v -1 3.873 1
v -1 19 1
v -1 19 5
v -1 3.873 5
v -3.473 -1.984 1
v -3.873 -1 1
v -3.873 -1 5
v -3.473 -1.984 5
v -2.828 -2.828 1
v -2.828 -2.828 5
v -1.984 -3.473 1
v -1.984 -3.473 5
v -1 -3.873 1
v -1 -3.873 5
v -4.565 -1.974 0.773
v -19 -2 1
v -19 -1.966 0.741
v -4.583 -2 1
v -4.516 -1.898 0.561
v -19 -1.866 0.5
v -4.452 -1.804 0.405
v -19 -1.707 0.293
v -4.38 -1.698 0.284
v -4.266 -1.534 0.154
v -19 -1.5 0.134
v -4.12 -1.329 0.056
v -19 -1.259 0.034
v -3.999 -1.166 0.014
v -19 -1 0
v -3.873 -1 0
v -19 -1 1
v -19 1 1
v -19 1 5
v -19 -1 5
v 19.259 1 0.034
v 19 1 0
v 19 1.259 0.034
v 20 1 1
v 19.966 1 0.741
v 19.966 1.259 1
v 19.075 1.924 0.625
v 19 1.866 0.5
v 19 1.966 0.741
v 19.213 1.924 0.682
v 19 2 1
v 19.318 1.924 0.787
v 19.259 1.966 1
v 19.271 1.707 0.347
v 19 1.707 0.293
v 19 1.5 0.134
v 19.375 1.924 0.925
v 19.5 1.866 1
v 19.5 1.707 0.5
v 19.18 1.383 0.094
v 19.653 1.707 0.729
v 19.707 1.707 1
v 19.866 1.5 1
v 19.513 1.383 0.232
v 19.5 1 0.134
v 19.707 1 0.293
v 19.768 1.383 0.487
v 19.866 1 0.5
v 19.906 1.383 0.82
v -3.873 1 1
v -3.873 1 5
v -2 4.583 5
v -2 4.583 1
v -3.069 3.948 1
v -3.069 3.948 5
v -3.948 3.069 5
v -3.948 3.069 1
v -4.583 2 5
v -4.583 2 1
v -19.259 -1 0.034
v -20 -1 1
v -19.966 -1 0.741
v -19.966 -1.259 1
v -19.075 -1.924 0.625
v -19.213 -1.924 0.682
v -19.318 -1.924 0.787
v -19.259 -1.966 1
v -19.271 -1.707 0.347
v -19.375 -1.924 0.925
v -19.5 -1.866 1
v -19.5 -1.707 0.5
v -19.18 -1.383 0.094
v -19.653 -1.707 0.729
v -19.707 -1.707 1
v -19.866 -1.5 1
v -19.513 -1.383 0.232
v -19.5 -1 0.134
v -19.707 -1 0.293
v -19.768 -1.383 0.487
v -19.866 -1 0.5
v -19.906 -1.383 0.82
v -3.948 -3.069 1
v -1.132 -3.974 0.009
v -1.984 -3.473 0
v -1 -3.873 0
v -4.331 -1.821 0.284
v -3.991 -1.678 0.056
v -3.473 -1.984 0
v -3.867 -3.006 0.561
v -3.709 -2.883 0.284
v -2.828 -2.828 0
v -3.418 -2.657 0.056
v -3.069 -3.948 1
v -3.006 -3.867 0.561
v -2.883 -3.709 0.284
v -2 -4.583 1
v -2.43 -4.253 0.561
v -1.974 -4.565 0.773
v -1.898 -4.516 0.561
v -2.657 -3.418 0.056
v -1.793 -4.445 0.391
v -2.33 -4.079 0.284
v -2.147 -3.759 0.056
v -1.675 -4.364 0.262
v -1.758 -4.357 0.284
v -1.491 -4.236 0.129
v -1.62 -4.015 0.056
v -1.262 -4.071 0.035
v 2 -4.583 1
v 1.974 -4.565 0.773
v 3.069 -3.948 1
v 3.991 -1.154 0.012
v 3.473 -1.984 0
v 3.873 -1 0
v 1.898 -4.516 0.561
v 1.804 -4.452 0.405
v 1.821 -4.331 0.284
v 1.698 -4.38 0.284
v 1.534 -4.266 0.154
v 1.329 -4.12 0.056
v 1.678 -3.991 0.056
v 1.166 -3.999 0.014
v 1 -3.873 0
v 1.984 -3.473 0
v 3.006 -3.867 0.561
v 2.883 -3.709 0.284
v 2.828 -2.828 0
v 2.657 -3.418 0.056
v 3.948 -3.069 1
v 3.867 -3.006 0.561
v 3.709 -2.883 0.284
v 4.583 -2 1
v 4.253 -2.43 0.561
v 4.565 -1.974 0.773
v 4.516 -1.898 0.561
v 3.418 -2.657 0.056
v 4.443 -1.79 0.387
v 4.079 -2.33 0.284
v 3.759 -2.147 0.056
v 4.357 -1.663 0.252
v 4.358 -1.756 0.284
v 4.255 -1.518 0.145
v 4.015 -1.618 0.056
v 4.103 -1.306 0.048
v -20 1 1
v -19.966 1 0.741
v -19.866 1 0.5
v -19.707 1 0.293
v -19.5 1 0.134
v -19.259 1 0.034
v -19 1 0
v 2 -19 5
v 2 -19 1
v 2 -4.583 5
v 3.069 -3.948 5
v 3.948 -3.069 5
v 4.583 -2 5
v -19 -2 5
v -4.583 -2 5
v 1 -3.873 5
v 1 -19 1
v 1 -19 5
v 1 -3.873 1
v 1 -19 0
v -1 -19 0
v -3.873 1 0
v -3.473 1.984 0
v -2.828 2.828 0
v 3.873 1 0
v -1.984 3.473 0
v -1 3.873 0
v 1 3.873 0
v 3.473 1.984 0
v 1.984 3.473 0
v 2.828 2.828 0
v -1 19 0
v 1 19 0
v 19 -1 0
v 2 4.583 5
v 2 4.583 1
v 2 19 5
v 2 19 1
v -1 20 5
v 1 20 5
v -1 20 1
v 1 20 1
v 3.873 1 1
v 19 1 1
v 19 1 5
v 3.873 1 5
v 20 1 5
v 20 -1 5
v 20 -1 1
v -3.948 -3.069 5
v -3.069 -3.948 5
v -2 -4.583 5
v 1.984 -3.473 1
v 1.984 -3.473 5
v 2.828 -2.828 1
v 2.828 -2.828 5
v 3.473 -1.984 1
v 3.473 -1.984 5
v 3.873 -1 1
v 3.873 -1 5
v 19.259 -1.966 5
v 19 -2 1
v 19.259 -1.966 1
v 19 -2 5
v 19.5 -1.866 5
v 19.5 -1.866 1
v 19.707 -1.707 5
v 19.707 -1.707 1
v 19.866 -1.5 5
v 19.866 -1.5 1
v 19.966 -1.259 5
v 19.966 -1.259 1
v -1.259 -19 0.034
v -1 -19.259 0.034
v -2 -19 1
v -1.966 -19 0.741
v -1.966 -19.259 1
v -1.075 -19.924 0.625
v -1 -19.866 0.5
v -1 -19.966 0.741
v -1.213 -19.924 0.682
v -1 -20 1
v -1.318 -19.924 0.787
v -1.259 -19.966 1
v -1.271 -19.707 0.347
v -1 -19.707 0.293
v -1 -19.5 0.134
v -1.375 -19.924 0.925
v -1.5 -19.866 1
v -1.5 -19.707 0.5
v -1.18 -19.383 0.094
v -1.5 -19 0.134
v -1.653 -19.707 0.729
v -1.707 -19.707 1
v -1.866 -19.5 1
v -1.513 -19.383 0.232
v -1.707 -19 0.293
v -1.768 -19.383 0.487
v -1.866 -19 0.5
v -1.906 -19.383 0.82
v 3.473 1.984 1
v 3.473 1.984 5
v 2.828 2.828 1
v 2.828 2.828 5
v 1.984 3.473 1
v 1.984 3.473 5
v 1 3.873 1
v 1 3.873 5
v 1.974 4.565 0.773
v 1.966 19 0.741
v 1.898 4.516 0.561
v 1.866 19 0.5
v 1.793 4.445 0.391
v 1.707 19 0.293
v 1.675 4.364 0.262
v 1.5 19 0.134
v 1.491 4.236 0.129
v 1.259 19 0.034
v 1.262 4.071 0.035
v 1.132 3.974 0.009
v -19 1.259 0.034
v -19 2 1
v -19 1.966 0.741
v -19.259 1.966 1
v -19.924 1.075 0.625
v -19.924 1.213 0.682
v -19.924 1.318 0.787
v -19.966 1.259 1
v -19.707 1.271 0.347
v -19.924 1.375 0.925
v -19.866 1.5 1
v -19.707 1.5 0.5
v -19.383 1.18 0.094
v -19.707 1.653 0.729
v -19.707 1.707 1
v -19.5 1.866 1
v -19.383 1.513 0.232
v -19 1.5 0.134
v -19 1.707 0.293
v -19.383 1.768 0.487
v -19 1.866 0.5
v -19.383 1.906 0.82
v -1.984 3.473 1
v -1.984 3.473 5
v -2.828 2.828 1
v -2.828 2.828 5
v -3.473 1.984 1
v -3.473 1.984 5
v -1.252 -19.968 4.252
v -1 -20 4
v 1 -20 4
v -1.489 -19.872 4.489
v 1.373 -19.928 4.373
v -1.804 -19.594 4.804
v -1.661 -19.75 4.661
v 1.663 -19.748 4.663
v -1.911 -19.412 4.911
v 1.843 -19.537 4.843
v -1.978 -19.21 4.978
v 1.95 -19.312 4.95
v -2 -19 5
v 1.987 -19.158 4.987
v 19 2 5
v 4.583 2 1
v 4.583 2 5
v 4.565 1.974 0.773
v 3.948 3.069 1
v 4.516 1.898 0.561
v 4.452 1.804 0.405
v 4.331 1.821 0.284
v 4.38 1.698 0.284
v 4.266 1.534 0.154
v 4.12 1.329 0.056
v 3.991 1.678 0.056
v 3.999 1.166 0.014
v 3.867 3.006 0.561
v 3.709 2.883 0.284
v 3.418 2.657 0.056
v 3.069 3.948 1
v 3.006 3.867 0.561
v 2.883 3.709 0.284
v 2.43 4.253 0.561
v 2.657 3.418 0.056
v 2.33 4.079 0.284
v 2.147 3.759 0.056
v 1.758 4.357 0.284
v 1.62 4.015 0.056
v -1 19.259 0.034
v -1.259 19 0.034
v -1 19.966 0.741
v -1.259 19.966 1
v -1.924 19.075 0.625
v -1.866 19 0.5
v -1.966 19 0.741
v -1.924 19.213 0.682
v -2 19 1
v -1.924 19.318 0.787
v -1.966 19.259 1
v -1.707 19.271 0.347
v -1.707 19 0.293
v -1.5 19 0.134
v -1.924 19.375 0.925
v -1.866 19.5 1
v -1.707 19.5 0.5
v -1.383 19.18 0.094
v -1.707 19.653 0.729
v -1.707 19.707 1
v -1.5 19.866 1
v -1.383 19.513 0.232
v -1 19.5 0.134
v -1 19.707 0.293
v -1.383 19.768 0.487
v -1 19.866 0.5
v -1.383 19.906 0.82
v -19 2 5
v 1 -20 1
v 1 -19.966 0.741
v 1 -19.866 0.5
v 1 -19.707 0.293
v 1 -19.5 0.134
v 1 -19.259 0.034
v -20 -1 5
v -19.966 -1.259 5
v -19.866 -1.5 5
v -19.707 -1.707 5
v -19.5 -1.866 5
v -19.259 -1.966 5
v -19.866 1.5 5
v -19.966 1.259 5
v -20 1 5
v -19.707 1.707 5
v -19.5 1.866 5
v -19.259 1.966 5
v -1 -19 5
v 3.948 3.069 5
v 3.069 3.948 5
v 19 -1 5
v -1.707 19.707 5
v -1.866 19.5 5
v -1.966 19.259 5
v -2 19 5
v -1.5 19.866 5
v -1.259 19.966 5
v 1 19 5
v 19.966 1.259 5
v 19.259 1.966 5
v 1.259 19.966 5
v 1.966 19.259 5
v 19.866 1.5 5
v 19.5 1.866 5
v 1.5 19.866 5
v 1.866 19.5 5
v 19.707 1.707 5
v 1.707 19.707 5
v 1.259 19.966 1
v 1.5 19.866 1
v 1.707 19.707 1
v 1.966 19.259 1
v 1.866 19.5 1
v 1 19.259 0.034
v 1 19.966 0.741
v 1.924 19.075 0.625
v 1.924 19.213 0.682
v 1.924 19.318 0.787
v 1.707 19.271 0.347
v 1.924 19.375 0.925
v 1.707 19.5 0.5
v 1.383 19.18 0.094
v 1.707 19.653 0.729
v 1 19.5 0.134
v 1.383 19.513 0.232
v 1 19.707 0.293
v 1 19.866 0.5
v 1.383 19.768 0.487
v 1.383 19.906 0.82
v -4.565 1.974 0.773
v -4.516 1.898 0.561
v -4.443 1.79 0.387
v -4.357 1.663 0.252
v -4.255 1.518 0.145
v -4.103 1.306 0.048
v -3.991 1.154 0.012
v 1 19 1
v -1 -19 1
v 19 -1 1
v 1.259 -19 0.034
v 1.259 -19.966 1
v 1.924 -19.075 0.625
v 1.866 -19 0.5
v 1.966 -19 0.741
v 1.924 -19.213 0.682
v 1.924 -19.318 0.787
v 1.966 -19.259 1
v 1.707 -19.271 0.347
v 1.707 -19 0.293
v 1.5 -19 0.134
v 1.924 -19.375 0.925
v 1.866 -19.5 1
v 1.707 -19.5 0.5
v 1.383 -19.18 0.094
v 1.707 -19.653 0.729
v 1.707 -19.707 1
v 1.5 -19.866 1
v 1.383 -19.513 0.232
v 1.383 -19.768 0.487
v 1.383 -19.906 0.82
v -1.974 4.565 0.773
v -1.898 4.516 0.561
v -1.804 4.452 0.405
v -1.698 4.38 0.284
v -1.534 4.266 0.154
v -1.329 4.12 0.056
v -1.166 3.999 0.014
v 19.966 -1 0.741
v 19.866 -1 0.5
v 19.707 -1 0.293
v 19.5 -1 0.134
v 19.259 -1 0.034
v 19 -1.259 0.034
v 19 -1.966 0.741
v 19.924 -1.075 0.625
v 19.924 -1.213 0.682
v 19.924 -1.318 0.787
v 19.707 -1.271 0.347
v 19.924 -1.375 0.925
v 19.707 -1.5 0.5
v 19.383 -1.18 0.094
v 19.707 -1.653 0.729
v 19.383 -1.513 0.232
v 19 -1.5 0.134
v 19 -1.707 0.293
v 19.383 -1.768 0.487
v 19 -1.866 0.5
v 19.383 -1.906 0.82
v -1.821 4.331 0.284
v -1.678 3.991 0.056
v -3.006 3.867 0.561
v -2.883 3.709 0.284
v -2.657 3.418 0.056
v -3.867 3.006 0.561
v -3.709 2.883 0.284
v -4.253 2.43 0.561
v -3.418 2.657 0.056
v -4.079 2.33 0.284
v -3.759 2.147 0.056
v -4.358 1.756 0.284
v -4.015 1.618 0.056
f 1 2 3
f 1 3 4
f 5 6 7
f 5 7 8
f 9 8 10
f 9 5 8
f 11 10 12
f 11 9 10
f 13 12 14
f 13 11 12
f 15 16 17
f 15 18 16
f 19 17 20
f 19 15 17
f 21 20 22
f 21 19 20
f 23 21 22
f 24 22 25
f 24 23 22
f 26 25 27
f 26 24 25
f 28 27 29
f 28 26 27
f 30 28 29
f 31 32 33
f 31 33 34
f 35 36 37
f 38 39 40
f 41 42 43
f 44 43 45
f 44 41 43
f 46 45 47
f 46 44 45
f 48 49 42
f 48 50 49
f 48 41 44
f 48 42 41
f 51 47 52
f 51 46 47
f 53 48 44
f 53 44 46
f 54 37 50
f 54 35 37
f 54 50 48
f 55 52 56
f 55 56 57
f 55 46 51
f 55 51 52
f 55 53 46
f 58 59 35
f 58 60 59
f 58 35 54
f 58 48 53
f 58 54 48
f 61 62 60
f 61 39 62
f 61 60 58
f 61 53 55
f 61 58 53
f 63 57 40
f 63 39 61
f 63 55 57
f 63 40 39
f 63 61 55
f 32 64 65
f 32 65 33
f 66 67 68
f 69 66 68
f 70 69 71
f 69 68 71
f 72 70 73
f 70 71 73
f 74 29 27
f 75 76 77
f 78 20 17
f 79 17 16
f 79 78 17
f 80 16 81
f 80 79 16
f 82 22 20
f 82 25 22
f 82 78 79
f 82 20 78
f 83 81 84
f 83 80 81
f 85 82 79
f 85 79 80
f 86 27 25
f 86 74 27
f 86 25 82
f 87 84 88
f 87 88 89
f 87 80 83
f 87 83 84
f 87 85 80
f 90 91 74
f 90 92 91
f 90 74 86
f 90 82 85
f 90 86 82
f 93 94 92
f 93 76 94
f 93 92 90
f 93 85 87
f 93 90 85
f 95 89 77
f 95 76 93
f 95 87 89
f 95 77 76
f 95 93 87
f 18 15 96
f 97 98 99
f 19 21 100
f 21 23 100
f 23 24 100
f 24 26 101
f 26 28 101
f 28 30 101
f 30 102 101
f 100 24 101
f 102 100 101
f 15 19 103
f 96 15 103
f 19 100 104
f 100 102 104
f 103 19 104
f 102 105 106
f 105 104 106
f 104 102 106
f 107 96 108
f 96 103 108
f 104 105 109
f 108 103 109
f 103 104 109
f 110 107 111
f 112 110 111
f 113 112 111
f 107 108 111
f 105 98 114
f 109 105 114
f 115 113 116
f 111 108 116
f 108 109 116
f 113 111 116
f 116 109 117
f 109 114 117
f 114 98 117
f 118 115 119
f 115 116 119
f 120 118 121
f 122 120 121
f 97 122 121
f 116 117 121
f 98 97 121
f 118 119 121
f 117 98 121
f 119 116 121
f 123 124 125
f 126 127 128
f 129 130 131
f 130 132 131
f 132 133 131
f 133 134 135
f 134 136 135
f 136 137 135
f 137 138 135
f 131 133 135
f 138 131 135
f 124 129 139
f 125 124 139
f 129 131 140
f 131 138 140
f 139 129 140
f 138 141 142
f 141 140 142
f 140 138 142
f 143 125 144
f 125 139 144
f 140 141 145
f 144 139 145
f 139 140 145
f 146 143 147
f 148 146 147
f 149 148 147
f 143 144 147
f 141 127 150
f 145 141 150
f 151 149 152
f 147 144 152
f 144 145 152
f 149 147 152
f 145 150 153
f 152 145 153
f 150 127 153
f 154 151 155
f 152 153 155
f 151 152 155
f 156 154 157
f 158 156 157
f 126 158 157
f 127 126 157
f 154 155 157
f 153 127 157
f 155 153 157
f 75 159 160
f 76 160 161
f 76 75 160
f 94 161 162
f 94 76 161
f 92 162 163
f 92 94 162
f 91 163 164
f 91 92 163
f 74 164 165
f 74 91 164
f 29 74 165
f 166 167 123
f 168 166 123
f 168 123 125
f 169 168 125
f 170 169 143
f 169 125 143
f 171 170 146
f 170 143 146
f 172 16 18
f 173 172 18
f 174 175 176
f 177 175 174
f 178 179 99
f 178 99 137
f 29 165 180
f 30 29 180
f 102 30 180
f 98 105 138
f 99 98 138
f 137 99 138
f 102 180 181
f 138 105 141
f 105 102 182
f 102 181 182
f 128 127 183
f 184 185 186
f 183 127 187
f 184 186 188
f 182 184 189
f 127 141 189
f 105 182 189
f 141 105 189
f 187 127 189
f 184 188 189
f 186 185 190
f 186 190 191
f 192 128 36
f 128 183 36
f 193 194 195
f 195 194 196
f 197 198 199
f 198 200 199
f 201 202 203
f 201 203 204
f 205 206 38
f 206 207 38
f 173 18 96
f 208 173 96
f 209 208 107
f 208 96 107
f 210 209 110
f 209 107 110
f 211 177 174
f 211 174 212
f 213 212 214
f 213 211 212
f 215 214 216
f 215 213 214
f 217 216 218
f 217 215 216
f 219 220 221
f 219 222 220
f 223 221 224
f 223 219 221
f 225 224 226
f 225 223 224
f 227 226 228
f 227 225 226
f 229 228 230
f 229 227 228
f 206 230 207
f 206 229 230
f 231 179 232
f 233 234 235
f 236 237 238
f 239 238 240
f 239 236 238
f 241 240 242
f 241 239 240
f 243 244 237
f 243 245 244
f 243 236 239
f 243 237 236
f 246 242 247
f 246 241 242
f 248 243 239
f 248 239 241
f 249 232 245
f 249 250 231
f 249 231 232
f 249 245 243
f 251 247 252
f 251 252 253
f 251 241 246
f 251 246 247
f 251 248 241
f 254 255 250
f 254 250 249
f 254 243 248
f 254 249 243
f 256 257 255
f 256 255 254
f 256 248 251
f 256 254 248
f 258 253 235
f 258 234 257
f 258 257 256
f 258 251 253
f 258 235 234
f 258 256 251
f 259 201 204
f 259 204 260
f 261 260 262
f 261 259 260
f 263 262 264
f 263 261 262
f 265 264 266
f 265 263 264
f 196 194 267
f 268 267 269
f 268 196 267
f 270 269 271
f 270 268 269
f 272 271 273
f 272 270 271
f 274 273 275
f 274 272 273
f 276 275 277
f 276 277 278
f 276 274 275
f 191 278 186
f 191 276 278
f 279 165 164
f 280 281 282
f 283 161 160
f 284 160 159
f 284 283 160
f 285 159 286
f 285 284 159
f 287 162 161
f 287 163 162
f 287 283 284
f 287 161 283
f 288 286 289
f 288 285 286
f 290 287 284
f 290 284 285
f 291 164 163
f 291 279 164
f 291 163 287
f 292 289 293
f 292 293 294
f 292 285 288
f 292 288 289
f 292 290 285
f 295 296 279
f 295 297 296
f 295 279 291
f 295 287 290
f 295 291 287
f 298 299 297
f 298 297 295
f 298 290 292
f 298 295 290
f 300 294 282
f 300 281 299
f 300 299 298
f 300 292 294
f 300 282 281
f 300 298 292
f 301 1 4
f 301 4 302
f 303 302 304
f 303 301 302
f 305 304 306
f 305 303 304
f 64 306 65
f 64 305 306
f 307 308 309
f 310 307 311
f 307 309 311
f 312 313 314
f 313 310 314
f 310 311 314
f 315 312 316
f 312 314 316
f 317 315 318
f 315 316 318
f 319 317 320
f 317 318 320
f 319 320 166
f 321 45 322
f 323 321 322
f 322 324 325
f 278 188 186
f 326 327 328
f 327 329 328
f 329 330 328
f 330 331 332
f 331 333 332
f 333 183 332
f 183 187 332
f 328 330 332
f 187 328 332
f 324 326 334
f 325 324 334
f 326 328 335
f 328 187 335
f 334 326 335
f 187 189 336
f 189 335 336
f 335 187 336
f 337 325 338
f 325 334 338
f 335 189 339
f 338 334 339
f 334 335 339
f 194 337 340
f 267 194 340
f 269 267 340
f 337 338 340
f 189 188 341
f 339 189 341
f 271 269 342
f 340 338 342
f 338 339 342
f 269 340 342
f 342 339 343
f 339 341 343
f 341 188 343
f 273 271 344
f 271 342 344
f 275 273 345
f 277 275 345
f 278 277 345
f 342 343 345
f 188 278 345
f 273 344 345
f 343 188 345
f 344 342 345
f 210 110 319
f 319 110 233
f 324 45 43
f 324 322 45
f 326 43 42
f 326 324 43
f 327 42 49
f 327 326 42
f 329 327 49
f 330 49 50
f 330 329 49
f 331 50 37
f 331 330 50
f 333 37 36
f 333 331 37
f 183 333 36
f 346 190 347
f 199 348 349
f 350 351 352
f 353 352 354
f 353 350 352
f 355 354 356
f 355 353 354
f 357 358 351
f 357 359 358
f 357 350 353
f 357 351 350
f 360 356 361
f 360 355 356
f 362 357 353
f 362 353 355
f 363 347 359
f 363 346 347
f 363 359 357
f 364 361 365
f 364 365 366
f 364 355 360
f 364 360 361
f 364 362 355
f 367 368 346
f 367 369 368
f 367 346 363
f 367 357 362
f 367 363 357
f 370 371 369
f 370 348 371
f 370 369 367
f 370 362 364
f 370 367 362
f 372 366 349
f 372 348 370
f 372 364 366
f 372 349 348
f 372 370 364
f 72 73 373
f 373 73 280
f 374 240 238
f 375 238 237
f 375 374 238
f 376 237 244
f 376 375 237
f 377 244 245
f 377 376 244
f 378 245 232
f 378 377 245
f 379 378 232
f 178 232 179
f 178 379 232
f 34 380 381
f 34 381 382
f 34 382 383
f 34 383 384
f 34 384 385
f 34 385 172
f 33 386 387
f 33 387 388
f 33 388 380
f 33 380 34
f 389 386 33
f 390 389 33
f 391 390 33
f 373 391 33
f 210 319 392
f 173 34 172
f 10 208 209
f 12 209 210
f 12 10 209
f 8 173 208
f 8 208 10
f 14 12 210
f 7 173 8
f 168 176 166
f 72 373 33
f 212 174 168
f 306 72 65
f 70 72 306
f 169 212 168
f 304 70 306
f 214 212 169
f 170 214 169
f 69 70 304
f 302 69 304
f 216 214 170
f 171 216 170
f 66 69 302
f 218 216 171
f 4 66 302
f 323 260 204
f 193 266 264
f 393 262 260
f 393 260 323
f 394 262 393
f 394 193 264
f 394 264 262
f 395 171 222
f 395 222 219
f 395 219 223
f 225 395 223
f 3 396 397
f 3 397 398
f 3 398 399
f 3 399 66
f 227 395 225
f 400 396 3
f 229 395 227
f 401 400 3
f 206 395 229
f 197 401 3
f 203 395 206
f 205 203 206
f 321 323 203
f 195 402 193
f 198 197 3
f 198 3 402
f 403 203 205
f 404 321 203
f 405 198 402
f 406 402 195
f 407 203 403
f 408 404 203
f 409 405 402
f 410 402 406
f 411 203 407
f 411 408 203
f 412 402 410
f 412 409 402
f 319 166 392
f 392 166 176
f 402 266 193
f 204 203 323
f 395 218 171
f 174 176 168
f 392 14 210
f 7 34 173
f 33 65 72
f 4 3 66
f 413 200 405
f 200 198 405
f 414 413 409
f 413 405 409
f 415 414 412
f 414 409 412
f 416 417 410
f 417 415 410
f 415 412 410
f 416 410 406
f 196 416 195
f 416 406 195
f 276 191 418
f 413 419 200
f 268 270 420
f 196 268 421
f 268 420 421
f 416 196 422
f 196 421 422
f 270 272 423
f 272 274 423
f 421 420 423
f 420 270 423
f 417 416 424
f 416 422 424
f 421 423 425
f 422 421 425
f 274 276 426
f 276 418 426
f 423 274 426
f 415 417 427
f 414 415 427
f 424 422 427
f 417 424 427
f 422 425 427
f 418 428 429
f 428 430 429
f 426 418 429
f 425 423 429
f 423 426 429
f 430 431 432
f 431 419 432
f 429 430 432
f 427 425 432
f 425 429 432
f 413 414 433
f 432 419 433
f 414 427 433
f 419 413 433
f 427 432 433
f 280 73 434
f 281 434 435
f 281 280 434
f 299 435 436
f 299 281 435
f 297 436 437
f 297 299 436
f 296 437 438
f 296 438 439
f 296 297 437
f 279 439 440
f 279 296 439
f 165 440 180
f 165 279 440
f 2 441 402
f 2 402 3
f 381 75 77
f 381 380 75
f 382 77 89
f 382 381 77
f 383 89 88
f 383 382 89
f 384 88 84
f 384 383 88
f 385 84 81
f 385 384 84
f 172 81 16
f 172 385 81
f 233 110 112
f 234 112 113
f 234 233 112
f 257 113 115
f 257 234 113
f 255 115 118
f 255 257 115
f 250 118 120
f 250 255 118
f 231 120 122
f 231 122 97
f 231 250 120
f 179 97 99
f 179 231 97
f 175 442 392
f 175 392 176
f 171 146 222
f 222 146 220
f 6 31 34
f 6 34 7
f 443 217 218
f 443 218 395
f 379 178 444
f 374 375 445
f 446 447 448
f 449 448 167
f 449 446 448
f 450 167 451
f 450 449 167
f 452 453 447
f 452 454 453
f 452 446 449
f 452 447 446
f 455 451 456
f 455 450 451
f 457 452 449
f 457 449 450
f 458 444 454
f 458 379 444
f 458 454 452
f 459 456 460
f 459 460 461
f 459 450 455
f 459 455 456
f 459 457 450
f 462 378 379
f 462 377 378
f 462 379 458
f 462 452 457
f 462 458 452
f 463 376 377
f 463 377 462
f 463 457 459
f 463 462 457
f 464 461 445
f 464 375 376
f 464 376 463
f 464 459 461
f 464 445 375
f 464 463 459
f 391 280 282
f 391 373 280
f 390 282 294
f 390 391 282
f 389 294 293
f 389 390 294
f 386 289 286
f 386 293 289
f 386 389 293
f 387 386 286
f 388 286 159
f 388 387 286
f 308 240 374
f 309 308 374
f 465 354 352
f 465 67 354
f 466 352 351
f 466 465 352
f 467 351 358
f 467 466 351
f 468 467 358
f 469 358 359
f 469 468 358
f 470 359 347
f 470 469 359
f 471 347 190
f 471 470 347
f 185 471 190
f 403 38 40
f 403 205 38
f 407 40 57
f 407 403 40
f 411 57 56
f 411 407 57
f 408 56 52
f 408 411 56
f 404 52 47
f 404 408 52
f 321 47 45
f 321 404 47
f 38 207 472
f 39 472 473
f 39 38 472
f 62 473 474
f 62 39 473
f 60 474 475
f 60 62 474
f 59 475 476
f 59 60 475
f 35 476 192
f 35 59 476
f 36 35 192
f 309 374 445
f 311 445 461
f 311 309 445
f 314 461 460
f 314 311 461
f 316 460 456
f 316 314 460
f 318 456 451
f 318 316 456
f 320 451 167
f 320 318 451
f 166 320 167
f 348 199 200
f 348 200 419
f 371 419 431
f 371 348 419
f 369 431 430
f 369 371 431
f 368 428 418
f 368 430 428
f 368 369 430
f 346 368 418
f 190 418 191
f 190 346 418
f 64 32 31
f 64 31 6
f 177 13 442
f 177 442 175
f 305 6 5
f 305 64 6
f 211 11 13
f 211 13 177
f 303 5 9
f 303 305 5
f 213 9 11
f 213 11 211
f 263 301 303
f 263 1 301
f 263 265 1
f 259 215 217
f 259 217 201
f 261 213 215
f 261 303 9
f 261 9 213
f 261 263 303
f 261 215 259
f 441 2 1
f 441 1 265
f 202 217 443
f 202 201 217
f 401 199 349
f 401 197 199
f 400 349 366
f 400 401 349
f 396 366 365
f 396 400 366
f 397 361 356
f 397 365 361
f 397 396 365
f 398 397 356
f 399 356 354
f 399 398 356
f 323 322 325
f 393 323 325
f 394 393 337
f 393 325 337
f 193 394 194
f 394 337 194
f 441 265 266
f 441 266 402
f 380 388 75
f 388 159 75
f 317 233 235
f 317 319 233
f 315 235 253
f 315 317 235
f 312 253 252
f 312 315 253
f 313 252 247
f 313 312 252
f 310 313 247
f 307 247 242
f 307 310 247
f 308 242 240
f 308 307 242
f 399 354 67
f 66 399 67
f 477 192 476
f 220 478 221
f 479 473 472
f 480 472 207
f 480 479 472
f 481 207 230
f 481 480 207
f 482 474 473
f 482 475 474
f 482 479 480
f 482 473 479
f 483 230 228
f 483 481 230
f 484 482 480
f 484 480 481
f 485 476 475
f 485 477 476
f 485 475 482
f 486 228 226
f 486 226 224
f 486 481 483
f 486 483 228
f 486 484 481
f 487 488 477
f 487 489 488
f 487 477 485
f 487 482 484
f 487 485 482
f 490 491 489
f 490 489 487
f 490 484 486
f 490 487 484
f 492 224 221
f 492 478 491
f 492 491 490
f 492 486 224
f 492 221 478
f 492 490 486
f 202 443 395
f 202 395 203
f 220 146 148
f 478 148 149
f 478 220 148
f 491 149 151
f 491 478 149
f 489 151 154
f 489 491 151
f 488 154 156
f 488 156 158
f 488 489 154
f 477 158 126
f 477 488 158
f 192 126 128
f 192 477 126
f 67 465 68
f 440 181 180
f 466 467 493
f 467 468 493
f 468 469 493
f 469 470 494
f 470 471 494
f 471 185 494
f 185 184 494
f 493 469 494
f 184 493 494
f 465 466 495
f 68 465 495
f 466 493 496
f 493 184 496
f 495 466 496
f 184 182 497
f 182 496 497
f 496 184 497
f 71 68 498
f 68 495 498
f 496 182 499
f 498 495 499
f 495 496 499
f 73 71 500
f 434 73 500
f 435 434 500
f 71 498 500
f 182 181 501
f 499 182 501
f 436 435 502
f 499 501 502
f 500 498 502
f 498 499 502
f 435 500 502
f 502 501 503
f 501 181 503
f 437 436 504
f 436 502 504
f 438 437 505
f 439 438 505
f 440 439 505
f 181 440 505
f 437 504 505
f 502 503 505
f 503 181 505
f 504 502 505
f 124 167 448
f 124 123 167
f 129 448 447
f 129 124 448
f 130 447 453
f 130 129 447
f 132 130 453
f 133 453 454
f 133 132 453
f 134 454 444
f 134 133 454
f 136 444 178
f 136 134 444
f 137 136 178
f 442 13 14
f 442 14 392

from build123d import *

# Parameters (mm, degrees)
F0_W     = 4
F0_H     = 4
F1_DEPTH = 5
F2_T     = -1
F3_R     = 0.99999


# Not quite as in the source:
# - a fillet or chamfer is up to 0.001 mm smaller than in the source, because OpenCascade refuses the exact size


with BuildPart() as f1:
    # F0 (on Top) → F1 (new body)
    with BuildSketch(Plane.XY):
        with BuildLine():
            ThreePointArc((-2, 4.582575695), (0, 5), (2, 4.582575695))
            Line((2, 4.582575695), (2, 20))
            Line((2, 20), (-2, 20))
            Line((-2, 20), (-2, 4.582575695))
        make_face()
        with BuildLine():
            Line((2, 2), (2, 4.582575695))
            ThreePointArc((2, 4.582575695), (0, 5), (-2, 4.582575695))
            Line((-2, 4.582575695), (-2, 2))
            Line((-2, 2), (2, 2))
        make_face()
        Rectangle(F0_W, F0_H)
        with BuildLine():
            ThreePointArc((-2, -4.582575695), (0, -5), (2, -4.582575695))
            Line((2, -4.582575695), (2, -2))
            Line((2, -2), (-2, -2))
            Line((-2, -2), (-2, -4.582575695))
        make_face()
        with BuildLine():
            Line((2, -20), (2, -4.582575695))
            ThreePointArc((2, -4.582575695), (0, -5), (-2, -4.582575695))
            Line((-2, -4.582575695), (-2, -20))
            Line((-2, -20), (2, -20))
        make_face()
        with BuildLine():
            ThreePointArc((4.582575695, 2), (4.8945315647, 1.0215482184), (5, 0))
            ThreePointArc((5, 0), (4.8945315647, -1.0215482184), (4.582575695, -2))
            Line((4.582575695, -2), (20, -2))
            Line((20, -2), (20, 2))
            Line((20, 2), (4.582575695, 2))
        make_face()
        with BuildLine():
            Line((2, 2), (4.582575695, 2))
            ThreePointArc((4.582575695, 2), (3.5355339059, 3.5355339059), (2, 4.582575695))
            Line((2, 4.582575695), (2, 2))
        make_face()
        with BuildLine():
            ThreePointArc((4.582575695, -2), (4.8945315647, -1.0215482184), (5, 0))
            ThreePointArc((5, 0), (4.8945315647, 1.0215482184), (4.582575695, 2))
            Line((4.582575695, 2), (2, 2))
            Line((2, 2), (2, -2))
            Line((2, -2), (4.582575695, -2))
        make_face()
        with BuildLine():
            ThreePointArc((2, -4.582575695), (3.5355339059, -3.5355339059), (4.582575695, -2))
            Line((4.582575695, -2), (2, -2))
            Line((2, -2), (2, -4.582575695))
        make_face()
        with BuildLine():
            Line((-2, -2), (-2, 2))
            Line((-2, 2), (-4.582575695, 2))
            ThreePointArc((-4.582575695, 2), (-5, 0), (-4.582575695, -2))
            Line((-4.582575695, -2), (-2, -2))
        make_face()
        with BuildLine():
            Line((-2, 2), (-2, 4.582575695))
            ThreePointArc((-2, 4.582575695), (-3.5355339059, 3.5355339059), (-4.582575695, 2))
            Line((-4.582575695, 2), (-2, 2))
        make_face()
        with BuildLine():
            ThreePointArc((-4.582575695, -2), (-3.5355339059, -3.5355339059), (-2, -4.582575695))
            Line((-2, -4.582575695), (-2, -2))
            Line((-2, -2), (-4.582575695, -2))
        make_face()
        with BuildLine():
            ThreePointArc((-4.582575695, -2), (-5, 0), (-4.582575695, 2))
            Line((-4.582575695, 2), (-20, 2))
            Line((-20, 2), (-20, -2))
            Line((-20, -2), (-4.582575695, -2))
        make_face()
    extrude(amount=F1_DEPTH)

    # F2
    f2_openings = [f1.faces().sort_by_distance(p)[0] for p in [
        (0, 0, 5),
    ]]
    offset(amount=F2_T, openings=f2_openings, kind=Kind.INTERSECTION)

    # F3 (radius 1 in the source; OpenCascade refuses exactly that, so slightly less here)
    f3_edges = [f1.edges().sort_by_distance(p)[0] for p in [
        (0, 20, 0),
        (-2, 12.291288, 0),
        (-3.535534, 3.535534, 0),
        (-12.291288, 2, 0),
        (-20, 0, 0),
        (-12.291288, -2, 0),
        (-3.535534, -3.535534, 0),
        (-2, -12.291288, 0),
        (0, -20, 0),
        (2, -12.291288, 0),
        (3.535534, -3.535534, 0),
        (12.291288, -2, 0),
        (20, 0, 0),
        (12.291288, 2, 0),
        (3.535534, 3.535534, 0),
        (2, 12.291288, 0),
        (2, -20, 2.5),
        (-2, -20, 2.5),
        (0, -20, 5),
        (-20, 2, 2.5),
        (-20, -2, 2.5),
        (-2, 20, 2.5),
        (2, 20, 2.5),
        (20, 2, 2.5),
        (20, -2, 2.5),
    ]]
    fillet(f3_edges, radius=F3_R)


solid = f1.part
